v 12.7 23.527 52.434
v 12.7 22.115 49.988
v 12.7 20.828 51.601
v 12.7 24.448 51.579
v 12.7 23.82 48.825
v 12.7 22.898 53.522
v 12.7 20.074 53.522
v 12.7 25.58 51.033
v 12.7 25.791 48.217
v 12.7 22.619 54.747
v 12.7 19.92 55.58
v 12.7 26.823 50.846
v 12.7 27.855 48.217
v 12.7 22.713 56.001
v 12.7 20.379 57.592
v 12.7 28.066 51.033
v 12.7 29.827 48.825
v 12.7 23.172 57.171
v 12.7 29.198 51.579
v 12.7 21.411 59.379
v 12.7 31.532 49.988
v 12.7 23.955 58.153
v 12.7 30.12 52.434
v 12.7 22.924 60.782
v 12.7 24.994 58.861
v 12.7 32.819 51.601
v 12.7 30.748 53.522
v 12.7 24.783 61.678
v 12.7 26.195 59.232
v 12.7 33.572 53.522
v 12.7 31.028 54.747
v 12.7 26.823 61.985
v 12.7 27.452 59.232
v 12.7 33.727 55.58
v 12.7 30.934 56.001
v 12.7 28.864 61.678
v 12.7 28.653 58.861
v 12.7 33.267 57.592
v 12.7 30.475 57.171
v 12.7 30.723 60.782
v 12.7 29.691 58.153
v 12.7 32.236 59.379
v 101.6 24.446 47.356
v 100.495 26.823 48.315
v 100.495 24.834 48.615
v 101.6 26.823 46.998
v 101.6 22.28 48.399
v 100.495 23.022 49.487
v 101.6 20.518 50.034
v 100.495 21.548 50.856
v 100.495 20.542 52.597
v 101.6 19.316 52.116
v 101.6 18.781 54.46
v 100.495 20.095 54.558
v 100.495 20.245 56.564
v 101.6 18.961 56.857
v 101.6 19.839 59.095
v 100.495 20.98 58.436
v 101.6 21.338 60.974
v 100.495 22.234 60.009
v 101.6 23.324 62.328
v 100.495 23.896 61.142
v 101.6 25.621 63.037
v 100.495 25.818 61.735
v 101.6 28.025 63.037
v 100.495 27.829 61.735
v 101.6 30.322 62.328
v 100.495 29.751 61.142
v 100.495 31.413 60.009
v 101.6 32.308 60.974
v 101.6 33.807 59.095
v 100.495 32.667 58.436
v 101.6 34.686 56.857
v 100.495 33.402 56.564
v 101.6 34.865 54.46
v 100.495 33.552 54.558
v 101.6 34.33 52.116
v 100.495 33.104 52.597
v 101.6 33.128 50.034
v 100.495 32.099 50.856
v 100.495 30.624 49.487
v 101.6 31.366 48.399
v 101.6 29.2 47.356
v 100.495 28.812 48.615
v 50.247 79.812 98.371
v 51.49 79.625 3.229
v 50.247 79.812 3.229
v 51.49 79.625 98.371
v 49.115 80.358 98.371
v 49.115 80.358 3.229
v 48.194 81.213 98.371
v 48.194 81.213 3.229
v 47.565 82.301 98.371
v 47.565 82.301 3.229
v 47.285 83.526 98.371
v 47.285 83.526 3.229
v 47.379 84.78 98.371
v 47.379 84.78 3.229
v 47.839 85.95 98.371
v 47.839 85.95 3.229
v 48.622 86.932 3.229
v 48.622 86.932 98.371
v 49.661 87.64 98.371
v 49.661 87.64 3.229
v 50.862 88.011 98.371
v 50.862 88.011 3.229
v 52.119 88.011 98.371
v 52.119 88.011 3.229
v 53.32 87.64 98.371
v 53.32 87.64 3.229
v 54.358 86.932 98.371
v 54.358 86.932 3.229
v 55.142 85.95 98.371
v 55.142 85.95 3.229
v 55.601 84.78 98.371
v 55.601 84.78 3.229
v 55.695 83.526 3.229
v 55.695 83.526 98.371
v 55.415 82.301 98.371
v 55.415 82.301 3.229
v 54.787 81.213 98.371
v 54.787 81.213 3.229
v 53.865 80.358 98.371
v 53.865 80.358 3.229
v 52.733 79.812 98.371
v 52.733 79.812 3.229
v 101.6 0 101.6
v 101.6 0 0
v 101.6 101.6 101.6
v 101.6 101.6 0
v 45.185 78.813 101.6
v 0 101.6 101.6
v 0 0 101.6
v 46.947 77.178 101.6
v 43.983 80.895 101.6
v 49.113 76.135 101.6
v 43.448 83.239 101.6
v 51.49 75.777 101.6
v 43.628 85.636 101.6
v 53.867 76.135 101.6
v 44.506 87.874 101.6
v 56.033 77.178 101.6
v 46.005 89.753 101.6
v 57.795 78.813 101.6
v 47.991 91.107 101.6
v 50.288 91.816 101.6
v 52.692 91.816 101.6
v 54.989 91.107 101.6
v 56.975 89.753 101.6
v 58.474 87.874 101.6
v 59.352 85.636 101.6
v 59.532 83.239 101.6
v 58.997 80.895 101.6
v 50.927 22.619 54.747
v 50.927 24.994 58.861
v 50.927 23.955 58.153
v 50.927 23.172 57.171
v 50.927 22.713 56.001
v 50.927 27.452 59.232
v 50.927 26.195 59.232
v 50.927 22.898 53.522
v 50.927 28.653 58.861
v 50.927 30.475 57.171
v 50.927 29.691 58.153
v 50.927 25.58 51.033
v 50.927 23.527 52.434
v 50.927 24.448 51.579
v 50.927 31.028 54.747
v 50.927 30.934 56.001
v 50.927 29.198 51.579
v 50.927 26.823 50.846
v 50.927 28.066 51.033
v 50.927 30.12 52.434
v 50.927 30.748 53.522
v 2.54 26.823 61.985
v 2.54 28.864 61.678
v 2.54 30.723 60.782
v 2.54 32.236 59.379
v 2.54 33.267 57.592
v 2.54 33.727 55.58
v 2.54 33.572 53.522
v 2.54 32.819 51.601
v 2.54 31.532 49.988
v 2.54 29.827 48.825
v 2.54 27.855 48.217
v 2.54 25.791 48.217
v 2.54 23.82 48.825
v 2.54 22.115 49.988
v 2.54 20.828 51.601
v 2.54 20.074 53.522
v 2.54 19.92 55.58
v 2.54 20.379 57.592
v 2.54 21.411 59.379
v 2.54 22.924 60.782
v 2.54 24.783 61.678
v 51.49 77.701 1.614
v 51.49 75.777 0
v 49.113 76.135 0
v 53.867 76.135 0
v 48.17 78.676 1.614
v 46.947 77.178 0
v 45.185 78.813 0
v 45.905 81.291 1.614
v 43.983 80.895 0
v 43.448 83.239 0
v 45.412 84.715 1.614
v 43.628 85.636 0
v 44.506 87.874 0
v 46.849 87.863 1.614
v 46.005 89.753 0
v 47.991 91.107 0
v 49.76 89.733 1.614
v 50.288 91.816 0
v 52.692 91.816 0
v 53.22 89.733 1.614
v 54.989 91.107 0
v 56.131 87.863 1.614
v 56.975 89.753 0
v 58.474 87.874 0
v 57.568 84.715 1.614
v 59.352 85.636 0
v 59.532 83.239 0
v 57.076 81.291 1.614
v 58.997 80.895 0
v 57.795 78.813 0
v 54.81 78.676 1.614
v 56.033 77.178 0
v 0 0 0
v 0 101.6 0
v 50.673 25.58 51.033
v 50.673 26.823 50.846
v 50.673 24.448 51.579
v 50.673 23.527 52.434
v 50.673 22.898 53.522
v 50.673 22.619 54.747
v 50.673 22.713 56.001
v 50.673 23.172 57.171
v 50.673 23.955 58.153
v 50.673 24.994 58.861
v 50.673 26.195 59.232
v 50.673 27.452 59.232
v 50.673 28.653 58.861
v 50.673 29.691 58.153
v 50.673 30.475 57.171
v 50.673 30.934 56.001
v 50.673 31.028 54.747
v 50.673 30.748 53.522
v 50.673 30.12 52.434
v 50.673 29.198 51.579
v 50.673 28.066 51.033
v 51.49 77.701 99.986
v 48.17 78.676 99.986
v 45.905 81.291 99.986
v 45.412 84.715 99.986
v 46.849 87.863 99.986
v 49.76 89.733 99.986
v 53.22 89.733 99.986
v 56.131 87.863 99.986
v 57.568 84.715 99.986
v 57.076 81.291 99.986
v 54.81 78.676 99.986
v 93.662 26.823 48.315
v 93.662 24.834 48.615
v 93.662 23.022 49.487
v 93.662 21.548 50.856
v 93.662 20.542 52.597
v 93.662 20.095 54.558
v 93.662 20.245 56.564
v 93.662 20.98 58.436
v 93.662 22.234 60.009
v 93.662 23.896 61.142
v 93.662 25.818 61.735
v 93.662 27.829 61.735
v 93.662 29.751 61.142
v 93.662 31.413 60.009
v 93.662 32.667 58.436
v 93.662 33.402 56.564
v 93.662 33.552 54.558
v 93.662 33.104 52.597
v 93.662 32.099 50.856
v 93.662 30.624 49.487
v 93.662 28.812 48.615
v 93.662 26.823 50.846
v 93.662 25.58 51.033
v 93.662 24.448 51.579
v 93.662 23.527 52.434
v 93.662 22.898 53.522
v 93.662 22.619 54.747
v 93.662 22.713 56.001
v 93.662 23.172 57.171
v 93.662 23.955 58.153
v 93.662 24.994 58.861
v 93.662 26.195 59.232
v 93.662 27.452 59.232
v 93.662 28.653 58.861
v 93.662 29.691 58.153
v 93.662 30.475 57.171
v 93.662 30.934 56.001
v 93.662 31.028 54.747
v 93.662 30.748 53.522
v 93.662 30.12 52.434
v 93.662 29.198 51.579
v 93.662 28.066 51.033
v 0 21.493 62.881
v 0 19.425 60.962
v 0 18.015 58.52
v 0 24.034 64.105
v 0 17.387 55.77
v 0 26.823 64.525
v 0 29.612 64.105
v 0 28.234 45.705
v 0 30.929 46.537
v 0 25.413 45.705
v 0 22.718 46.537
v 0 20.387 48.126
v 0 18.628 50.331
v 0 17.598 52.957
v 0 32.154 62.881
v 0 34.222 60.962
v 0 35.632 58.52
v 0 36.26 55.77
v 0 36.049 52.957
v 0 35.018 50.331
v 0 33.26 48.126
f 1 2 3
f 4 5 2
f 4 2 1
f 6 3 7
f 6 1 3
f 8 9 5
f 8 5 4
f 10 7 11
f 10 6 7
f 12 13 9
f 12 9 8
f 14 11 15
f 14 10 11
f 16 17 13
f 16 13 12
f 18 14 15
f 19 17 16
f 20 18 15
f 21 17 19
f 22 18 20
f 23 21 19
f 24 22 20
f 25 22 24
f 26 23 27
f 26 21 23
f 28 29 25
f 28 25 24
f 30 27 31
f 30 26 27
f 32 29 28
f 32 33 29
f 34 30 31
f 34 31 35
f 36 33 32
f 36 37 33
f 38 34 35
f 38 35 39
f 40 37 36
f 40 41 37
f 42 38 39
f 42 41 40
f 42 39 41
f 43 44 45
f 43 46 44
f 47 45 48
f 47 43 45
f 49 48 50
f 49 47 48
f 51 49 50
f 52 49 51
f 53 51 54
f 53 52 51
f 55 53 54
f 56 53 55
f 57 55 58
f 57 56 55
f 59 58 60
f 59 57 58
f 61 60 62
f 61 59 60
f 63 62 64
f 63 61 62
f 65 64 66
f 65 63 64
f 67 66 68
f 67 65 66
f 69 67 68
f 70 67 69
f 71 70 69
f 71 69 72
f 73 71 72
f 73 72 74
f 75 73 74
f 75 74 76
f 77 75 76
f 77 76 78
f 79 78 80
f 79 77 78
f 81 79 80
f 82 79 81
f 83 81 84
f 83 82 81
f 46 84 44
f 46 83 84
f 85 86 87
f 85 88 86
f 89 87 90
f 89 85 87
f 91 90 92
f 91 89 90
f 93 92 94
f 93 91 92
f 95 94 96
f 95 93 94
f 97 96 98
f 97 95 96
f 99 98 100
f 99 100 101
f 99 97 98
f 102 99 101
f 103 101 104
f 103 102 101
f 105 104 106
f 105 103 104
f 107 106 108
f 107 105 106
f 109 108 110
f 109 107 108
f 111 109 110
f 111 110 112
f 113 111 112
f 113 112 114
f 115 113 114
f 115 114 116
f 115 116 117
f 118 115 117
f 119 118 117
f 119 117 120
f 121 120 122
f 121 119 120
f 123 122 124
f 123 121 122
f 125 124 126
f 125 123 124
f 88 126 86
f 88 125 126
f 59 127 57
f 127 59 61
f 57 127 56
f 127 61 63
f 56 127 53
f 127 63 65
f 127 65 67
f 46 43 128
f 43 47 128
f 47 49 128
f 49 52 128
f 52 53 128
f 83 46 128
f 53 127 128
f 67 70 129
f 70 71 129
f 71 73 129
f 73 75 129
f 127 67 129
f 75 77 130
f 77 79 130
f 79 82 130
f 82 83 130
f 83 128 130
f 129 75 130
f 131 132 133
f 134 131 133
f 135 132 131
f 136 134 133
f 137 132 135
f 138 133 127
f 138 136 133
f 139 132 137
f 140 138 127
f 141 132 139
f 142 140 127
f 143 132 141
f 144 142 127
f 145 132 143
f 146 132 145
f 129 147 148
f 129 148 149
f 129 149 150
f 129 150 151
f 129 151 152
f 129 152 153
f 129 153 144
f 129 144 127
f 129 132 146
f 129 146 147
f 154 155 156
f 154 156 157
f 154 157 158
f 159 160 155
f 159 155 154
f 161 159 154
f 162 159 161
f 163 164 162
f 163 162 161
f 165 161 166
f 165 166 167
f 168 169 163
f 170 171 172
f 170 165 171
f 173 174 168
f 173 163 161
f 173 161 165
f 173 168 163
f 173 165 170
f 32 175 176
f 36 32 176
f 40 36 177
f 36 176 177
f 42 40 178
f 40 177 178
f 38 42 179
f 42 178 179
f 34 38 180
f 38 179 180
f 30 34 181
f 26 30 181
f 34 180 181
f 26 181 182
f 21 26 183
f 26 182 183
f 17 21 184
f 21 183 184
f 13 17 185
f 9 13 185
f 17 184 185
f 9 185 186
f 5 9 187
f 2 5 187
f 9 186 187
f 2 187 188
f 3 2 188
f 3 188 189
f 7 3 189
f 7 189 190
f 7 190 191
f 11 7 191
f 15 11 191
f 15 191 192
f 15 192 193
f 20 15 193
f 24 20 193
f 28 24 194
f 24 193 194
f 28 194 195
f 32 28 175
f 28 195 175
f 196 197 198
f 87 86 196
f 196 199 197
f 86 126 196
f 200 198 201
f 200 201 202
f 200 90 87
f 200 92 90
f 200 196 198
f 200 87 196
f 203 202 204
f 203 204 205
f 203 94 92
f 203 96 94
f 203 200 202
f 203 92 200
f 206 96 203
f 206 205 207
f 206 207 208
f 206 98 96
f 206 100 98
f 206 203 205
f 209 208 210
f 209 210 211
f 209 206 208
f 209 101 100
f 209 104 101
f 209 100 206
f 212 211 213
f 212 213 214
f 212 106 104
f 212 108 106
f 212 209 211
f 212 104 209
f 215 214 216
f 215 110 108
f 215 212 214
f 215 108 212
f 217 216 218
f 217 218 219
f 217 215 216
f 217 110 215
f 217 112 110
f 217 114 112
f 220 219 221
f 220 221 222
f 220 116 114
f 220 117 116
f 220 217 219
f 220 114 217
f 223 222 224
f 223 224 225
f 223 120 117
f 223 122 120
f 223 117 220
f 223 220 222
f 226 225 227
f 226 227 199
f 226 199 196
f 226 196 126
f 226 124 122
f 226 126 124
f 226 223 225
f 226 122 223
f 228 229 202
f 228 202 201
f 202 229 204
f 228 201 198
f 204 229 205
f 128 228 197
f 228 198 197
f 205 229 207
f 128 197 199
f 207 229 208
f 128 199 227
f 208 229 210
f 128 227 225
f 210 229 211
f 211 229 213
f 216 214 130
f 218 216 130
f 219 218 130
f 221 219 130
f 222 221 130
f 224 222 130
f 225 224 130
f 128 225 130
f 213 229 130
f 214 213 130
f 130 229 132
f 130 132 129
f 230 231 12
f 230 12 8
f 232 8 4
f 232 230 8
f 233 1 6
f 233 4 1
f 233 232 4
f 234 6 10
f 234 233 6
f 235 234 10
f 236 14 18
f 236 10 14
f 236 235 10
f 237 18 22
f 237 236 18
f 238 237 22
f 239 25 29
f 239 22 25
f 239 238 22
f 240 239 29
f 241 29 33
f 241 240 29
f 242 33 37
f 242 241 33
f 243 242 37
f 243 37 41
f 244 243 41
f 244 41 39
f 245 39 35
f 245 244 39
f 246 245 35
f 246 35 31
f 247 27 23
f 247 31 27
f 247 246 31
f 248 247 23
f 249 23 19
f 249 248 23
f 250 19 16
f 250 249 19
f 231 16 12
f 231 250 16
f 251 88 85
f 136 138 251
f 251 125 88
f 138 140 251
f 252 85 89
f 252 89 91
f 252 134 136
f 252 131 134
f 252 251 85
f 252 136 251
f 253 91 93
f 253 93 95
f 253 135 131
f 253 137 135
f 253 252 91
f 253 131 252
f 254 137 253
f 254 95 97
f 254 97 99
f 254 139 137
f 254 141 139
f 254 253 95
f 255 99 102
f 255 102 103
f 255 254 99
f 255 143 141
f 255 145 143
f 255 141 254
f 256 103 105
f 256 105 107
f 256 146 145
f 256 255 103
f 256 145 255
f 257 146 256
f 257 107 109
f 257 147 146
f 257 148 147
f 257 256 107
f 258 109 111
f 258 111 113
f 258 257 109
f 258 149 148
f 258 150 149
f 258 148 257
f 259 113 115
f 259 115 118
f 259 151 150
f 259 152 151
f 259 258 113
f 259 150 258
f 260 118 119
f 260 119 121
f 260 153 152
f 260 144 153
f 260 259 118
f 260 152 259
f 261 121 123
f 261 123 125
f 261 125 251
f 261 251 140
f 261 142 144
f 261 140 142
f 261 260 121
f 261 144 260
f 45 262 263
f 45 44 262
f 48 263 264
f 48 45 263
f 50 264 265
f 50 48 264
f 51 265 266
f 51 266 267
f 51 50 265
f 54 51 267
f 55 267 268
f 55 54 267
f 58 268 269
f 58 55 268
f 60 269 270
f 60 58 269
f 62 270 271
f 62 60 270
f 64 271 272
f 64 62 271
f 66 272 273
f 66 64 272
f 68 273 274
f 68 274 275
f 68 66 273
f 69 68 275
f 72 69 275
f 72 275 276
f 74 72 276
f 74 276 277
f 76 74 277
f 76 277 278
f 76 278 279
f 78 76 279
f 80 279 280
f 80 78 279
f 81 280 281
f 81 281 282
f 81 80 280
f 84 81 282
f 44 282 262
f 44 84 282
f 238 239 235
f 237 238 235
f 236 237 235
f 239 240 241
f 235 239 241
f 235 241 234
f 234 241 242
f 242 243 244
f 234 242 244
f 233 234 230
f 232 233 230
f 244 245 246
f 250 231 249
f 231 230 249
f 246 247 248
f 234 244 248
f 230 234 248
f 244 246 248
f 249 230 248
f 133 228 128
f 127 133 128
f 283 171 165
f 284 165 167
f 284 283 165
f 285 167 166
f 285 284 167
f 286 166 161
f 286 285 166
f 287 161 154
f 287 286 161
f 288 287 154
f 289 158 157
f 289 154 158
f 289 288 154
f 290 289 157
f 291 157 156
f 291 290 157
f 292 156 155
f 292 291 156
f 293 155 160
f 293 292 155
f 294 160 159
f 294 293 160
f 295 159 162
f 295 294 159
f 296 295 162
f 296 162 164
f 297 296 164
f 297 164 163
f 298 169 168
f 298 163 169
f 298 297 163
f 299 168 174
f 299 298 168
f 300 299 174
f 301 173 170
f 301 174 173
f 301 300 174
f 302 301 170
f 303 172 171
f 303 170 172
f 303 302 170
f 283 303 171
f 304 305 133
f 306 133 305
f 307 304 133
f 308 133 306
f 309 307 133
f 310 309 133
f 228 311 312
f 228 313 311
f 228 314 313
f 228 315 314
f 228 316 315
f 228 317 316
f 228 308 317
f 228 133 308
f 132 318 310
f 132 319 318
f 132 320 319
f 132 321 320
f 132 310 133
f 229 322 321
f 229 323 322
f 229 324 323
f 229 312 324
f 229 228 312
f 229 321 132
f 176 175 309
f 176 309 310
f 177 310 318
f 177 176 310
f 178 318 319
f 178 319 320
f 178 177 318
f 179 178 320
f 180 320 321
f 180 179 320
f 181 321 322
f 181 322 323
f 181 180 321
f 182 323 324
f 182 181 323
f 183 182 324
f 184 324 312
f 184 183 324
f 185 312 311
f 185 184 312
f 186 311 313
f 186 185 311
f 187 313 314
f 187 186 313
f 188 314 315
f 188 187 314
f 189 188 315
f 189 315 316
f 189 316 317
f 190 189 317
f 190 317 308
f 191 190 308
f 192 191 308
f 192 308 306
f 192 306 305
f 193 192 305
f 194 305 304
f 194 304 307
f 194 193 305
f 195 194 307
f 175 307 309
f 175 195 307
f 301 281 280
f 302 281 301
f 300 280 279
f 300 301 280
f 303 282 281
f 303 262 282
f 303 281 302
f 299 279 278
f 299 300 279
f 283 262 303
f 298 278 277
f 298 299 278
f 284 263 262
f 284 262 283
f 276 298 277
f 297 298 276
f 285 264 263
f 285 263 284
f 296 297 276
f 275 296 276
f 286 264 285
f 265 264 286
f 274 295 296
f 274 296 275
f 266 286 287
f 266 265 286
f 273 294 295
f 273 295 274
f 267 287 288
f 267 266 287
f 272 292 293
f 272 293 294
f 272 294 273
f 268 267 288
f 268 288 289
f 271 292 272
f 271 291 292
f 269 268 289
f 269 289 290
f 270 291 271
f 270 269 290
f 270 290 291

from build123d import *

# Parameters (mm, degrees)
SKETCH1_W           = 101.6
SKETCH1_H           = 101.6
BOSS_EXTRUDE1_DEPTH = 101.6
SKETCH6_R           = 6.922774564
CUT_EXTRUDE1_DEPTH  = 12.7
CHAMFER2_SIZE       = 2.54
SKETCH7_R           = 4.2164
BOSS_EXTRUDE2_DEPTH = 0.127


with BuildPart() as part:
    # Sketch1 → Boss-Extrude1 (new body)
    with BuildSketch(Plane.XY):
        with Locations((50.8, 50.8)):
            Rectangle(SKETCH1_W, SKETCH1_H)
    extrude(amount=BOSS_EXTRUDE1_DEPTH)

    # Sketch3 → CSK for 5/16 Flat Head Machine Screw (100)1 (revolve, cut)
    with BuildSketch(Plane(origin=(51.490087233, 83.841482184, 101.6), x_dir=(0, -1, 0), z_dir=(1, 0, 0))):
        Polygon((0, 0), (0, 101.6), (8.0645, 101.6), (4.2164, 98.371060709), (4.2164, 3.228939291), (8.0645, 0), align=None)
    revolve(axis=Axis((51.490087233, 83.841482184, 107.95), (0, 0, -1)), mode=Mode.SUBTRACT)

    # Sketch5 → CBORE for 5/16 Socket Head Cap Screw1 (revolve, cut)
    with BuildSketch(Plane(origin=(101.6, 26.823245181, 55.06253419), x_dir=(0, 0, -1), z_dir=(0, 1, 0))):
        Polygon((0, 0), (0, 101.6), (4.2164, 101.6), (4.2164, 7.9375), (6.74751, 7.9375), (6.74751, 1.105085823), (8.0645, 0), align=None)
    revolve(axis=Axis((107.95, 26.823245181, 55.06253419), (-1, 0, 0)), mode=Mode.SUBTRACT)

    # Sketch6 → Cut-Extrude1 (cut)
    with BuildSketch(Plane.ZY):
        with Locations((55.06253419, 26.823245181)):
            Circle(SKETCH6_R)
    extrude(amount=-CUT_EXTRUDE1_DEPTH, mode=Mode.SUBTRACT)

    # Chamfer2
    chamfer2_edges = [part.edges().sort_by_distance(p)[0] for p in [
        (0, 26.823245181, 48.139759626),
    ]]
    chamfer(chamfer2_edges, length=CHAMFER2_SIZE)

    # Sketch7 → Boss-Extrude2 (add, symmetric)
    with BuildSketch(Plane(origin=(50.8, 0, 0), x_dir=(0, 0, -1), z_dir=(1, 0, 0))):
        with Locations((-55.06253419, 26.823245181)):
            Circle(SKETCH7_R)
    extrude(amount=BOSS_EXTRUDE2_DEPTH, both=True)


solid = part.part
